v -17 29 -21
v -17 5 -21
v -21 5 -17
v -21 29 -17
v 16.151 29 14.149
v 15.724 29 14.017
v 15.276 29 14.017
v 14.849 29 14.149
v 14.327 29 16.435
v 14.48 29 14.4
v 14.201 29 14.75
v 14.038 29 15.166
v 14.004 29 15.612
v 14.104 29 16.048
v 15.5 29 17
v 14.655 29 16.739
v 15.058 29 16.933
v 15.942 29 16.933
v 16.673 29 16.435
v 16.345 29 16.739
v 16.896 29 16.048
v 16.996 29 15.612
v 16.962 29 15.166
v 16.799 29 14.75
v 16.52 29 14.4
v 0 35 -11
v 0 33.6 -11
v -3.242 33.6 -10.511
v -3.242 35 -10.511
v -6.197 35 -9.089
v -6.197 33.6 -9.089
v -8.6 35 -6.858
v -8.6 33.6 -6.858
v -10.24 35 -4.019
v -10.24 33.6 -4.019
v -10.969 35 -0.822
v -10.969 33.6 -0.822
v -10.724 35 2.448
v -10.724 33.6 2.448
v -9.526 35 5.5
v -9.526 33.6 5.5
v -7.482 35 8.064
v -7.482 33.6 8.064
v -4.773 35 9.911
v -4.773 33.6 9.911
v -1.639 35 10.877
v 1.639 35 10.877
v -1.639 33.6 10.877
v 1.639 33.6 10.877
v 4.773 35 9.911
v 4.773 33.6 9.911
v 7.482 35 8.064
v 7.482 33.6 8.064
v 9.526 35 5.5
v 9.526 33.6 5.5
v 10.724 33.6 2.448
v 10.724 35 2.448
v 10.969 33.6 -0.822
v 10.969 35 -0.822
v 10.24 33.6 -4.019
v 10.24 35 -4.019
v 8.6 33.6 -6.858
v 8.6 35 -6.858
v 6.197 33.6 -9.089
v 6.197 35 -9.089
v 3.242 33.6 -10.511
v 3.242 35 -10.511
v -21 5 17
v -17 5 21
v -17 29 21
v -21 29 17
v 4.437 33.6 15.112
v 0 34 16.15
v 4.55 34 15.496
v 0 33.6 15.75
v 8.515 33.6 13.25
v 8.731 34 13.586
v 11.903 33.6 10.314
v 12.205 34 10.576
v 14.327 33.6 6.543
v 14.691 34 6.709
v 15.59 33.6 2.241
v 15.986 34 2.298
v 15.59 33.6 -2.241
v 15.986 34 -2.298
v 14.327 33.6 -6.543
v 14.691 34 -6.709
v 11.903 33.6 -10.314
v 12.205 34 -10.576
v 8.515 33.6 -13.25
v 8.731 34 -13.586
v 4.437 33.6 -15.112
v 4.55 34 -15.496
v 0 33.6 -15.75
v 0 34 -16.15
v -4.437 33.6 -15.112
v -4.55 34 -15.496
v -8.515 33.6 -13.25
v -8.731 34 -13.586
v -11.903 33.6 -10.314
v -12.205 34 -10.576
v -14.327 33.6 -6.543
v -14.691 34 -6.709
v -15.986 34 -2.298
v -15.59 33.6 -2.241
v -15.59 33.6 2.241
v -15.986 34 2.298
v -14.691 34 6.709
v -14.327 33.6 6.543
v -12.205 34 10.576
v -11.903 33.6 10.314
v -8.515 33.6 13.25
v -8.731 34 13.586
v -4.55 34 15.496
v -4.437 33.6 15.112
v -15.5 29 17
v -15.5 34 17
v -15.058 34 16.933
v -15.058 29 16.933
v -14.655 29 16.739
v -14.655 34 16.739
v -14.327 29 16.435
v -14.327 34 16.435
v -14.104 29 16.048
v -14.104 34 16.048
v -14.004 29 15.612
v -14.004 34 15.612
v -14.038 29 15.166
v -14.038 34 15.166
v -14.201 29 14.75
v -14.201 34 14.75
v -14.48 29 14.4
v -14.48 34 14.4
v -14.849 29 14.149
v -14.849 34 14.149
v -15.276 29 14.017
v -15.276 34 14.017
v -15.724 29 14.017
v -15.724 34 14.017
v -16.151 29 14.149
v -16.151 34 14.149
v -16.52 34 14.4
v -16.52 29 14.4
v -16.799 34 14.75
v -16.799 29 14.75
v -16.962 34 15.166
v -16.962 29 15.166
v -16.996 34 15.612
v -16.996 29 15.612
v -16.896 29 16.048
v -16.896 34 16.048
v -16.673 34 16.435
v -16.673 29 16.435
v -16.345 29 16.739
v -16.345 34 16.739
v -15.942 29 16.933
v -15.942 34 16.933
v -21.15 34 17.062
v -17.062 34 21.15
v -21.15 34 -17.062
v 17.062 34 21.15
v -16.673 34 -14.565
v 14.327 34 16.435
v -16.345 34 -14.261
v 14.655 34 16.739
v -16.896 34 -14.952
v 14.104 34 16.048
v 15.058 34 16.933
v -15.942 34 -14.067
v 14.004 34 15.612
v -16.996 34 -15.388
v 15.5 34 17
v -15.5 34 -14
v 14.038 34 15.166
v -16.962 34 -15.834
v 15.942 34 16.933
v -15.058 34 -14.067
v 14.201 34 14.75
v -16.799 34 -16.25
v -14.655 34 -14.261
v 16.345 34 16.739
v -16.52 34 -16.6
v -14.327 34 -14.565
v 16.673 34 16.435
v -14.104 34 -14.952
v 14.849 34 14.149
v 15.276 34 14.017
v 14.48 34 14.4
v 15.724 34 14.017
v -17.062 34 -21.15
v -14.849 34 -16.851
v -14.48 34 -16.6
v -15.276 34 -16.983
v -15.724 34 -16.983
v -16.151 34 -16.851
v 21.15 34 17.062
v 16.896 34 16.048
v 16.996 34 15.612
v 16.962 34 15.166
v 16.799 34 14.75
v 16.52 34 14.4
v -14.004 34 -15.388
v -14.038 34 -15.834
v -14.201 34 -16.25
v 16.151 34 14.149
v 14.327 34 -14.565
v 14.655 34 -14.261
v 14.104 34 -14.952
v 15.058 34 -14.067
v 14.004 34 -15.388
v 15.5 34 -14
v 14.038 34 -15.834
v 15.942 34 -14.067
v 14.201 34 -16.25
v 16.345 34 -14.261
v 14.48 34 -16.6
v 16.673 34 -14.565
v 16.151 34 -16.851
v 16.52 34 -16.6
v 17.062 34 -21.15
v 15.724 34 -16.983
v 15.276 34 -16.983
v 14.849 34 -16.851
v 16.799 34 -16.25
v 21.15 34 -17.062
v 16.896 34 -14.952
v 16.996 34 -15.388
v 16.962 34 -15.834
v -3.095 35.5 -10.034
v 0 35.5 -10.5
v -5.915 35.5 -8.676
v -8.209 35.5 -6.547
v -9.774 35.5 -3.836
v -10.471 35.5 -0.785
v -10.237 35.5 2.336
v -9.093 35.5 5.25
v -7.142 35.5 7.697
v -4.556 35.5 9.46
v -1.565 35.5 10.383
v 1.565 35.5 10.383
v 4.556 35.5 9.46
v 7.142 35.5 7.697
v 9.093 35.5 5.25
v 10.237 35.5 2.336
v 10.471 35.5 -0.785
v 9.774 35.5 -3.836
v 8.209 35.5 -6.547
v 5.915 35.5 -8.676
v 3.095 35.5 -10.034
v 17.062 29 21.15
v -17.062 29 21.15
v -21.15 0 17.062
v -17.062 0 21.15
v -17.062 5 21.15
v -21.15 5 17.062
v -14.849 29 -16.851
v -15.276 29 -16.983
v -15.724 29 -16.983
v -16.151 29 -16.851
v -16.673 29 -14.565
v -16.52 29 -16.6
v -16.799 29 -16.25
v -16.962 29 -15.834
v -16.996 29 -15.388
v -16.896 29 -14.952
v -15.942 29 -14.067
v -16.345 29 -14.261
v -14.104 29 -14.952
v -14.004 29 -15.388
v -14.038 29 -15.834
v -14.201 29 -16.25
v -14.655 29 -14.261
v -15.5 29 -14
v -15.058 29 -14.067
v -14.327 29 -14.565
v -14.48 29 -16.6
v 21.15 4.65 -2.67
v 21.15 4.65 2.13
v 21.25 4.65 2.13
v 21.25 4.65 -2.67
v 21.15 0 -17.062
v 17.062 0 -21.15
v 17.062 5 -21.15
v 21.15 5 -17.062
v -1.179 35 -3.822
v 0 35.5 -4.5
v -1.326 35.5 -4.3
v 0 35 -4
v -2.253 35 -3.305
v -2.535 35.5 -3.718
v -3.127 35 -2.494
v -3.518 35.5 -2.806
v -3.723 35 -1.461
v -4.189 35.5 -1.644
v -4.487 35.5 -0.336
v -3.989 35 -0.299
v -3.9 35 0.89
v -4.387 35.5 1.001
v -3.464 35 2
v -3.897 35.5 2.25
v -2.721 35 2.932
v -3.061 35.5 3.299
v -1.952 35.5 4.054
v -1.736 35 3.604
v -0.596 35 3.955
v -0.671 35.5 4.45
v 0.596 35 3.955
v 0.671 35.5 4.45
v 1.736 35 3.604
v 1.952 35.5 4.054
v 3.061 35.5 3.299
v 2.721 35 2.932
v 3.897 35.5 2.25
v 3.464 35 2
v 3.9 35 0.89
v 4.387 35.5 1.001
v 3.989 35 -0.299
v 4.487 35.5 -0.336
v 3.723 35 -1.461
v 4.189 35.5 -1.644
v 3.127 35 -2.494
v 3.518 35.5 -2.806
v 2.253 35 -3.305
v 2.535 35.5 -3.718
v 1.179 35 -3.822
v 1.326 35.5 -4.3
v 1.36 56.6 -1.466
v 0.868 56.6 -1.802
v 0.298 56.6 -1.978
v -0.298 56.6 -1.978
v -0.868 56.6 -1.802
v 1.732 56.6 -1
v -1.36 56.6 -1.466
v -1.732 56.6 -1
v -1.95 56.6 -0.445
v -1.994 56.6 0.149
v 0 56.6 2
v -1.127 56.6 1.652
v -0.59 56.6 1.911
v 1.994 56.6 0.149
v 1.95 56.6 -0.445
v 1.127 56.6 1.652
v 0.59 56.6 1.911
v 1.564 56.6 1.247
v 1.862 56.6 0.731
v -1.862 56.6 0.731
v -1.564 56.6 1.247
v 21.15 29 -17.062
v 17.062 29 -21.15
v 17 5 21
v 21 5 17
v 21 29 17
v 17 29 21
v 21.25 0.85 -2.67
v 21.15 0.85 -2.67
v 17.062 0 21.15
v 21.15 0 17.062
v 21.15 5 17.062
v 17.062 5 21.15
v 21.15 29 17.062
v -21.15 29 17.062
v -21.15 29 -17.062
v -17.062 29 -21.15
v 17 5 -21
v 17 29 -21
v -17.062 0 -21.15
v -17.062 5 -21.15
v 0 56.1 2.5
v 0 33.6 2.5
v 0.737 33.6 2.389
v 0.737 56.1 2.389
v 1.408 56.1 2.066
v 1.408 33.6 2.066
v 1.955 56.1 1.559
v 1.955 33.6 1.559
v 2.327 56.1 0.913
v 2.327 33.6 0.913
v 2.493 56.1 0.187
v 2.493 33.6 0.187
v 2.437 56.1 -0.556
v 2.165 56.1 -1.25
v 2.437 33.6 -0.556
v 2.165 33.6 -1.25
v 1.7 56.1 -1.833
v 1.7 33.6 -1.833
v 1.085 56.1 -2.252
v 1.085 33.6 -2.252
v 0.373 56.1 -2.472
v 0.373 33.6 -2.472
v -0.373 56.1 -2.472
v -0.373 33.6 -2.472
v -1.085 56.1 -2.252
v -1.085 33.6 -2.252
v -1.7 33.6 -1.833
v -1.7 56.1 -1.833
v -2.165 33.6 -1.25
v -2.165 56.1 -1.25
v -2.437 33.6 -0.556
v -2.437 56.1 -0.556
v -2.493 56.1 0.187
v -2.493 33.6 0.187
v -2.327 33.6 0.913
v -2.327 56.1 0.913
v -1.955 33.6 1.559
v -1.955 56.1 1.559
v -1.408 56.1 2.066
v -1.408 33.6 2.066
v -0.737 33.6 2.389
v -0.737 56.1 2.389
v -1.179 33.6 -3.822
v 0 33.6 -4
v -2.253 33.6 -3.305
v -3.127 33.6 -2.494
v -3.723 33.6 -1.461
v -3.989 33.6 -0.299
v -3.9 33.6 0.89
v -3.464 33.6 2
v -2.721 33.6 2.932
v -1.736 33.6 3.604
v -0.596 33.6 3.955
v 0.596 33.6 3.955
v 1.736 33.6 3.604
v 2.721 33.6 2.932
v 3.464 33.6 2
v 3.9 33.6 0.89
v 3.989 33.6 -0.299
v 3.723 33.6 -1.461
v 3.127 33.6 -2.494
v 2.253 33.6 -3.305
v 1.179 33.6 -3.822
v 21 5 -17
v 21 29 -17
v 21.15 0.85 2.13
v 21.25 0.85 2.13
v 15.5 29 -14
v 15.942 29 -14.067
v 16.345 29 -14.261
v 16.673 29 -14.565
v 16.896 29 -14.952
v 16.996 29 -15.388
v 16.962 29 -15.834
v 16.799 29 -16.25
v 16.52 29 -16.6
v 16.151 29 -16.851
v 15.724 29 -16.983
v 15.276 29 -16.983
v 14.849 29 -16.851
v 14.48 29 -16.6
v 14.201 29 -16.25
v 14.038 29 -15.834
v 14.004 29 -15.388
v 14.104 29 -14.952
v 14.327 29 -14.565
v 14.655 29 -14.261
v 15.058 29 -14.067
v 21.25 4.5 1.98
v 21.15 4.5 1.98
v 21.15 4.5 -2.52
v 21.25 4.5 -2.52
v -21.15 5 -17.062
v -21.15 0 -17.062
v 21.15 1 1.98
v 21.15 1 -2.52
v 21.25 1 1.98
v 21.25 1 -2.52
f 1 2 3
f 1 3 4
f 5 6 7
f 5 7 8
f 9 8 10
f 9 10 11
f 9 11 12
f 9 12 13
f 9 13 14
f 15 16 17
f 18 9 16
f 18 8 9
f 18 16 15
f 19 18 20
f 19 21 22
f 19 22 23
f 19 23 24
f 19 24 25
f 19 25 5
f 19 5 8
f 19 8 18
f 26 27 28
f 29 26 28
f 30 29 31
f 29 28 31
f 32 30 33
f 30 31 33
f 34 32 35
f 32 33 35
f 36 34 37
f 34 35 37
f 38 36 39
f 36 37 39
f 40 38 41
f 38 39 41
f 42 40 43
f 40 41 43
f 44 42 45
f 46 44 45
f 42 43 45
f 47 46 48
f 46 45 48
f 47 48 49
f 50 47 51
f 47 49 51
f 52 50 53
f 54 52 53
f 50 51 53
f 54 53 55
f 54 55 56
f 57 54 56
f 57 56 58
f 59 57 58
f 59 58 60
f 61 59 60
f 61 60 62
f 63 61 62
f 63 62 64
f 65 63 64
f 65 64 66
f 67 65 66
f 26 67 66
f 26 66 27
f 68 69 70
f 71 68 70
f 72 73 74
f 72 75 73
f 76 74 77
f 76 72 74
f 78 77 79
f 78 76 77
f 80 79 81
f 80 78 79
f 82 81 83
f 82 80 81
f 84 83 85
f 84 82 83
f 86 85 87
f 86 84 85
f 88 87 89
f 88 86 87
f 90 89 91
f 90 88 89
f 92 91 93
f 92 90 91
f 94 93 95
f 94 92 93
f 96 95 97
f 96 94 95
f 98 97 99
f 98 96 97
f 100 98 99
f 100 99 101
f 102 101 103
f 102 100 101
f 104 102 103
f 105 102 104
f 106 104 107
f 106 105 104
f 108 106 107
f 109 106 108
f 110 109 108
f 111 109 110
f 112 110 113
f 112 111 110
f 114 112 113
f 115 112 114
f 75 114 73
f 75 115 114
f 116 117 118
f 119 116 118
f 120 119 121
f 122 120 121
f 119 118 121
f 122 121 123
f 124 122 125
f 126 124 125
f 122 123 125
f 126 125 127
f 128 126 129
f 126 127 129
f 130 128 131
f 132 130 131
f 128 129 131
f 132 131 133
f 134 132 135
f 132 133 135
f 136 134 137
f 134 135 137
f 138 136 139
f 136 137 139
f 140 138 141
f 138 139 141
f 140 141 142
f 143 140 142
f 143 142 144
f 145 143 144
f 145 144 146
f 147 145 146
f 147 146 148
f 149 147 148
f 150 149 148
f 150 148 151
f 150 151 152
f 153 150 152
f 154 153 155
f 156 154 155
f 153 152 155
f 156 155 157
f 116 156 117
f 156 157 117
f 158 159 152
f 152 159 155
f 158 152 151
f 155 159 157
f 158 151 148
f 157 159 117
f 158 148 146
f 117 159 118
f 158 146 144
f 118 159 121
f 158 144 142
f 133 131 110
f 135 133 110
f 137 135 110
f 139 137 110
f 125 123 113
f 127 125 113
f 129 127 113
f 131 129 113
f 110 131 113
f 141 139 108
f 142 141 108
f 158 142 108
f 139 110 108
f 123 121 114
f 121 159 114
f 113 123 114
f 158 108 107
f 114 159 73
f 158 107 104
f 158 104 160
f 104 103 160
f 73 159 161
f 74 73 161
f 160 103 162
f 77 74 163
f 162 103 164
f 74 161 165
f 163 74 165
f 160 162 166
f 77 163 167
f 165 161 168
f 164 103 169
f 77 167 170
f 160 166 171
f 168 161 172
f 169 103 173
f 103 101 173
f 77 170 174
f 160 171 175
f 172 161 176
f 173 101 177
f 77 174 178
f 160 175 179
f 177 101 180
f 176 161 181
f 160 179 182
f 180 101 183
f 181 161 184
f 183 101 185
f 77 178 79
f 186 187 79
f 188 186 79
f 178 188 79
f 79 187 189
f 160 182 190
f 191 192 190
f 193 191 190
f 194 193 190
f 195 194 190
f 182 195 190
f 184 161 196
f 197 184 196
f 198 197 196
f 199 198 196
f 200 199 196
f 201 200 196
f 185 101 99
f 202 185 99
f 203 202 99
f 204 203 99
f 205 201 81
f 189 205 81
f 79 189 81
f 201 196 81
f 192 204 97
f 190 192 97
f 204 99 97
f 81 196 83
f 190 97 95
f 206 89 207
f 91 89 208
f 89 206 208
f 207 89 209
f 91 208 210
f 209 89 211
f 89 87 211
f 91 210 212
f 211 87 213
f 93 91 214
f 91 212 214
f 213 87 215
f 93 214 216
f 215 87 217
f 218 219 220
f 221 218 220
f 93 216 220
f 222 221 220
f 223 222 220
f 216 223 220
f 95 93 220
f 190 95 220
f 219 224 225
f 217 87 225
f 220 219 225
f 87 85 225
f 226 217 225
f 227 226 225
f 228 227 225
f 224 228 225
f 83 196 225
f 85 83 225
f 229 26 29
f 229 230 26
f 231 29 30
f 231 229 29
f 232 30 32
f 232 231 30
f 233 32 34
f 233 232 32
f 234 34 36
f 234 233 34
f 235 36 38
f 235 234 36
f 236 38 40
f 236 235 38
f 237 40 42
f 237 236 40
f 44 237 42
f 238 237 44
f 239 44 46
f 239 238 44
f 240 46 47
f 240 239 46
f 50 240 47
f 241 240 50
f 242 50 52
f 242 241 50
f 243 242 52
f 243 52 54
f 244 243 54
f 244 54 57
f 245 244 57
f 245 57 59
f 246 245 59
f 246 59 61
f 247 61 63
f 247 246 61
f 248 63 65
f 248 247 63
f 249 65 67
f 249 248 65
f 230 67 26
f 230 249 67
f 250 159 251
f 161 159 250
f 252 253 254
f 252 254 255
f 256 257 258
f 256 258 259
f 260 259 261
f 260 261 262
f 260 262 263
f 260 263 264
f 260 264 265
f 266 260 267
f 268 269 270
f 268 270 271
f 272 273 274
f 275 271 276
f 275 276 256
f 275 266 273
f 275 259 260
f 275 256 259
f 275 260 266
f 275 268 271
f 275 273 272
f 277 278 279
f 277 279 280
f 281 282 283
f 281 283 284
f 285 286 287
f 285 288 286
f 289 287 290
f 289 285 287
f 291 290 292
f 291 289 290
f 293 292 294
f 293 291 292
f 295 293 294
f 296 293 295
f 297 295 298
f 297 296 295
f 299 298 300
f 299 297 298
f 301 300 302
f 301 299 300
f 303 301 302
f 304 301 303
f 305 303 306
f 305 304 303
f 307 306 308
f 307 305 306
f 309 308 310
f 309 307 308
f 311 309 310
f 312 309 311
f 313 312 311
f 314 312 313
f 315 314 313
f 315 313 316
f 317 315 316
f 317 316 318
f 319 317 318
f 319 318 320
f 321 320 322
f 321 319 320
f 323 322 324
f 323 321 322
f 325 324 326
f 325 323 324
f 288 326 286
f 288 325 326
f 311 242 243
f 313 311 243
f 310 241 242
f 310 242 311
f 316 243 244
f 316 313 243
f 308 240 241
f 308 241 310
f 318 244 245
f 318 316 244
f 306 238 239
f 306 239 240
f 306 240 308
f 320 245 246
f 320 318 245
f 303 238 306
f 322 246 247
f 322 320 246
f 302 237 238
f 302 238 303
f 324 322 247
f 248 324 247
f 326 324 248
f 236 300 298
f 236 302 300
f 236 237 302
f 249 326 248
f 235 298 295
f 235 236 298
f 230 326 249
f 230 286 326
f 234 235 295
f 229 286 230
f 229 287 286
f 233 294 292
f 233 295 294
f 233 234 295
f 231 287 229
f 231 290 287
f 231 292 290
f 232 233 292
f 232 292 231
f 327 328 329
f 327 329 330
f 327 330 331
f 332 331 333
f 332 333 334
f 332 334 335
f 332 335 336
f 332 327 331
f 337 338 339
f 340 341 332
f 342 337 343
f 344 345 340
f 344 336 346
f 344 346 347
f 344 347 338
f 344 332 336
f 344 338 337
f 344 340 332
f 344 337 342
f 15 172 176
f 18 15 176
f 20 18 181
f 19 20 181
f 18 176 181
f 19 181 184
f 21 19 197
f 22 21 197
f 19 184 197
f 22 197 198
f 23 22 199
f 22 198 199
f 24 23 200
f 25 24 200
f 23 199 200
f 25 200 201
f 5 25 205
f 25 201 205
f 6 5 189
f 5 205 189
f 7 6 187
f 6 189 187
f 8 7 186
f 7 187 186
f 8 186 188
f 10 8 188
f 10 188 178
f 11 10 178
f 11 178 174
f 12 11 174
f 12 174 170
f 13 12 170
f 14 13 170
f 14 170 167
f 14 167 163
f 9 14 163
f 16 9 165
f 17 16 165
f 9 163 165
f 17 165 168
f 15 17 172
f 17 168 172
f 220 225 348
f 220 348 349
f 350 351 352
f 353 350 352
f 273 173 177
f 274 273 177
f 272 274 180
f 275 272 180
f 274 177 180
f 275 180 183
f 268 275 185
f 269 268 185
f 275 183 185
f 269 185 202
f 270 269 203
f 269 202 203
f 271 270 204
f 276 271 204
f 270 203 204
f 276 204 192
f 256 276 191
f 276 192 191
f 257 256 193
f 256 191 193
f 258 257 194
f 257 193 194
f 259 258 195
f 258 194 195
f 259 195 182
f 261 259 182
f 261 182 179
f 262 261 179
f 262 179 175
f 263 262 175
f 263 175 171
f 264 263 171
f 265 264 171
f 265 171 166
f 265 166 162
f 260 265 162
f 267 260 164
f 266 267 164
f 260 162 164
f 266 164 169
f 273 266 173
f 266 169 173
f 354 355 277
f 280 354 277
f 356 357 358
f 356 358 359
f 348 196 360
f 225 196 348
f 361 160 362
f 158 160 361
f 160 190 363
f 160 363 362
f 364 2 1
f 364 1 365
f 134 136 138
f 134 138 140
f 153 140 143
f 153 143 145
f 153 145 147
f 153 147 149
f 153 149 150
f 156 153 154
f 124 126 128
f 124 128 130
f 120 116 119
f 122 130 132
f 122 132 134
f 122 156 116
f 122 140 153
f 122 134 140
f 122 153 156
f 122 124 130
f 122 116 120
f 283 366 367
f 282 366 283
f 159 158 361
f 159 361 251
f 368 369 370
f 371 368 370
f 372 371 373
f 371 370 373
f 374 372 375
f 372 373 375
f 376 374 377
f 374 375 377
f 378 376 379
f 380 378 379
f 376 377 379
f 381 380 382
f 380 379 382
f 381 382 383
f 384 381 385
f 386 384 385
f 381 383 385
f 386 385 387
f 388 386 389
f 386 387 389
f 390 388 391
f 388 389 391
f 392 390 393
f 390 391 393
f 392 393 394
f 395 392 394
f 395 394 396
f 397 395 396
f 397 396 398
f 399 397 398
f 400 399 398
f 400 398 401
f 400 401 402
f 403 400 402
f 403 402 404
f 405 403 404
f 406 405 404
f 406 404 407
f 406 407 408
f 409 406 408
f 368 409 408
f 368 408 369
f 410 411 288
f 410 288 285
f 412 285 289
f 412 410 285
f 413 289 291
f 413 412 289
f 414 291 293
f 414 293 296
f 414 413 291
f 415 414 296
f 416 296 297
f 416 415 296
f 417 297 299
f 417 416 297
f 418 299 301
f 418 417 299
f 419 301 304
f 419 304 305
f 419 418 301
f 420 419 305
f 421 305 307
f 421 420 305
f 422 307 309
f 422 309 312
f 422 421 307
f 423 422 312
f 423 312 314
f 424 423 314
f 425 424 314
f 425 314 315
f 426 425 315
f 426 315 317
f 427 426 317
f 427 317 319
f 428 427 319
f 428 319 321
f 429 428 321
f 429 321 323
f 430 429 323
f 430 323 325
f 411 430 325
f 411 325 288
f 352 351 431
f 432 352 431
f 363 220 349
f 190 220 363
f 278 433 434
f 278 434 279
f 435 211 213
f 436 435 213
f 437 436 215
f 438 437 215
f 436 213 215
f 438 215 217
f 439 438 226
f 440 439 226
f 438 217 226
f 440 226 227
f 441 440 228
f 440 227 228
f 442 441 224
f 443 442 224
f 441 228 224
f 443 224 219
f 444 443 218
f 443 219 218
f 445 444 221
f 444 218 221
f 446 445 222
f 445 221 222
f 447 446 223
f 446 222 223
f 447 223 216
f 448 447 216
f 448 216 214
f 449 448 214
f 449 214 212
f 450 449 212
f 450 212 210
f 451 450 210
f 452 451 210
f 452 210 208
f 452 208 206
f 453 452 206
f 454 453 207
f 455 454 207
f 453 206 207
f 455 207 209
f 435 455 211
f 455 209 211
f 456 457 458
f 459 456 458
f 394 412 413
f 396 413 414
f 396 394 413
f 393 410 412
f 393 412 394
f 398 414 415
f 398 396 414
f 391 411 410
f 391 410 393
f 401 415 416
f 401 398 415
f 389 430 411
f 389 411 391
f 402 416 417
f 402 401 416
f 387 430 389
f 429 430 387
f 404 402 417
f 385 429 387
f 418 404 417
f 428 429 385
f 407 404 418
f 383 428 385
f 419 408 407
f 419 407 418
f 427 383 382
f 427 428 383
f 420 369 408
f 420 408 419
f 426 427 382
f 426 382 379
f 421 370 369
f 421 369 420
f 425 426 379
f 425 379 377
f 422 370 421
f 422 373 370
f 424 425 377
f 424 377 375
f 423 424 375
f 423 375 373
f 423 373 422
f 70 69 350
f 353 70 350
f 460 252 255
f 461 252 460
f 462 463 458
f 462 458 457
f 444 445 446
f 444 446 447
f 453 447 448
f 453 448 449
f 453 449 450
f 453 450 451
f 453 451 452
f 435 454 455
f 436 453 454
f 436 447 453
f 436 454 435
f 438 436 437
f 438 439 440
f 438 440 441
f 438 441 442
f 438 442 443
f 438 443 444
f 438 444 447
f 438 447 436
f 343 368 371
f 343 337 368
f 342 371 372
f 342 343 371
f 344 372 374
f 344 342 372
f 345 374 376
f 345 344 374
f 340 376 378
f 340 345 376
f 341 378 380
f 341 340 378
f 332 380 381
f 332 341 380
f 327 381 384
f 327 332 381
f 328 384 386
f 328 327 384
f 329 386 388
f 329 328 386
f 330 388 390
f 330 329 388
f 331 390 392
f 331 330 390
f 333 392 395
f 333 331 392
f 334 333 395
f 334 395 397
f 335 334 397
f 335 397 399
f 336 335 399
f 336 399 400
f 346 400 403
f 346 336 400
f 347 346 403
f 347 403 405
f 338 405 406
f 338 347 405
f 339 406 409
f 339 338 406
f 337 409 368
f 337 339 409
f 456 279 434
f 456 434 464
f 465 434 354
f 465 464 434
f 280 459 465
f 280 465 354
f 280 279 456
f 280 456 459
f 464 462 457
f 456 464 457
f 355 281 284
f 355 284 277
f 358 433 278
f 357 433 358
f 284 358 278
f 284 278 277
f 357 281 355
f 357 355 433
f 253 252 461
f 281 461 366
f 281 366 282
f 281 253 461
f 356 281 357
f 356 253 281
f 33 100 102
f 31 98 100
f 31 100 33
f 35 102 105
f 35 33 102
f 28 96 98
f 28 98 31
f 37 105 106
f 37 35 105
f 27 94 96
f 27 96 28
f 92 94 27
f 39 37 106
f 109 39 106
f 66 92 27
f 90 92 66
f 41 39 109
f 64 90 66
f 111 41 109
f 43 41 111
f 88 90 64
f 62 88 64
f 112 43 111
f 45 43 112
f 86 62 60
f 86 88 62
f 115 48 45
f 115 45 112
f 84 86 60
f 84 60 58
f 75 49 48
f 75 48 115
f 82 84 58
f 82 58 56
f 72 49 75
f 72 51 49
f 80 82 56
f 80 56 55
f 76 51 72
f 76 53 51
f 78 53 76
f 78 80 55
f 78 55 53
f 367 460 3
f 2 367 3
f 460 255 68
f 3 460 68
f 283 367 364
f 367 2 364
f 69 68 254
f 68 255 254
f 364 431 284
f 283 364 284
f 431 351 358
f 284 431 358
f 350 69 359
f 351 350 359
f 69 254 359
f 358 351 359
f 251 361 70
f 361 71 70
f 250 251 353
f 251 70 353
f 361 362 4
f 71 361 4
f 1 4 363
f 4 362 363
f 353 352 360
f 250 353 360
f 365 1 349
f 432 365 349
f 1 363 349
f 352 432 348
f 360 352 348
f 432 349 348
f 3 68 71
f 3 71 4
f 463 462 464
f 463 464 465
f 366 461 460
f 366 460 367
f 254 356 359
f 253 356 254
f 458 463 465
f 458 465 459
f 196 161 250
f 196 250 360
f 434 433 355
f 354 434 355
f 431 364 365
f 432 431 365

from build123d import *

# Parameters (mm, degrees)
SKETCH1_W           = 42
SKETCH1_H           = 42
BOSS_EXTRUDE1_DEPTH = 34
CHAMFER1_SIZE       = 4
BOSS_EXTRUDE4_DEPTH = 5
BOSS_EXTRUDE5_DEPTH = 5
SKETCH2_R           = 16.25
CUT_EXTRUDE1_DEPTH  = 0.4
SKETCH3_R           = 11
SKETCH3_R_2         = 4
BOSS_EXTRUDE2_DEPTH = 1.9
SKETCH4_R           = 2.5
BOSS_EXTRUDE3_DEPTH = 23
CHAMFER2_SIZE       = 0.5
SKETCH5_R           = 1.5
CUT_EXTRUDE2_DEPTH  = 5
SKETCH8_W           = 4.8
SKETCH8_H           = 3.8
SKETCH8_W_2         = 4.5
SKETCH8_H_2         = 3.5
BOSS_EXTRUDE6_DEPTH = 0.1


with BuildPart() as part:
    # Sketch1 → Boss-Extrude1 (new body)
    with BuildSketch(Plane(origin=(0, 0, 0), x_dir=(1, 0, 0), z_dir=(0, 1, 0))):
        Rectangle(SKETCH1_W, SKETCH1_H)
    extrude(amount=BOSS_EXTRUDE1_DEPTH)

    # Chamfer1
    chamfer1_edges = [part.edges().sort_by_distance(p)[0] for p in [
        (21, 17, 21),
        (-21, 17, 21),
        (-21, 17, -21),
        (21, 17, -21),
    ]]
    chamfer(chamfer1_edges, length=CHAMFER1_SIZE)

    # Sketch6 → Boss-Extrude4 (add)
    with BuildSketch(Plane(origin=(0, 34, 0), x_dir=(1, 0, 0), z_dir=(0, 1, 0))):
        Polygon((17.062132034, 21.15), (-17.062132034, 21.15), (-21.15, 17.062132034), (-21.15, -17.062132034), (-17.062132034, -21.15), (17.062132034, -21.15), (21.15, -17.062132034), (21.15, 17.062132034), align=None)
    extrude(amount=-BOSS_EXTRUDE4_DEPTH)

    # Sketch7 → Boss-Extrude5 (add)
    with BuildSketch(Plane.XZ):
        Polygon((-21.15, 17.062132034), (-21.15, -17.062132034), (-17.062132034, -21.15), (17.062132034, -21.15), (21.15, -17.062132034), (21.15, 17.062132034), (17.062132034, 21.15), (-17.062132034, 21.15), align=None)
    extrude(amount=-BOSS_EXTRUDE5_DEPTH)

    # Sketch2 → Cut-Extrude1 (cut)
    with BuildSketch(Plane(origin=(0, 34, 0), x_dir=(1, 0, 0), z_dir=(0, 1, 0))):
        with Locations(Location((0, 0, 0), (0, 0, 270))):
            Circle(SKETCH2_R)
    extrude(amount=-CUT_EXTRUDE1_DEPTH, mode=Mode.SUBTRACT)

    # Sketch3 → Boss-Extrude2 (add)
    with BuildSketch(Plane(origin=(0, 33.6, 0), x_dir=(1, 0, 0), z_dir=(0, 1, 0))):
        with Locations(Location((0, 0, 0), (0, 0, 90))):
            Circle(SKETCH3_R)
        with Locations(Location((0, 0, 0), (0, 0, 90))):
            Circle(SKETCH3_R_2, mode=Mode.SUBTRACT)
    extrude(amount=BOSS_EXTRUDE2_DEPTH)

    # Sketch4 → Boss-Extrude3 (add)
    with BuildSketch(Plane(origin=(0, 33.6, 0), x_dir=(1, 0, 0), z_dir=(0, 1, 0))):
        with Locations(Location((0, 0, 0), (0, 0, 270))):
            Circle(SKETCH4_R)
    extrude(amount=BOSS_EXTRUDE3_DEPTH)

    # Chamfer2
    # the kernel refuses this chamfer: 0.5 mm, written as the material it adds along each edge
    with BuildSketch(Plane(origin=(0, 33.6, 0), x_dir=(0, 0, 1), z_dir=(-1, 0, 0))) as chamfer2_piece_1_section:
        Polygon((16.25, CHAMFER2_SIZE), (16.25 - CHAMFER2_SIZE, 0), (16.25, 0), align=None)
    chamfer2_piece_1 = revolve(axis=Axis((0, 33.6, 0), (0, 1, 0)), mode=Mode.PRIVATE)
    chamfer2_piece_1 = split(chamfer2_piece_1, bisect_by=Plane(origin=(0, 34, -15.959627936), z_dir=(0, -1, 0)), keep=Keep.TOP, mode=Mode.PRIVATE)
    add(chamfer2_piece_1)
    # the kernel refuses this chamfer: 0.5 mm, written as the material it takes off along each edge
    with BuildSketch(Plane(origin=(0, 35.5, 0), x_dir=(0, 0, -1), z_dir=(1, 0, 0))) as chamfer2_2_piece_1:
        Polygon((4 + CHAMFER2_SIZE, 0), (4, -CHAMFER2_SIZE), (4, 0), align=None)
    revolve(axis=Axis((0, 35.5, 0), (0, 1, 0)), mode=Mode.SUBTRACT)
    with BuildSketch(Plane(origin=(0, 35.5, 0), x_dir=(0, 0, -1), z_dir=(1, 0, 0))) as chamfer2_2_piece_2:
        Polygon((11, -CHAMFER2_SIZE), (11 - CHAMFER2_SIZE, 0), (11, 0), align=None)
    revolve(axis=Axis((0, 35.5, 0), (0, 1, 0)), mode=Mode.SUBTRACT)
    with BuildSketch(Plane(origin=(0, 56.6, 0), x_dir=(0, 0, 1), z_dir=(-1, 0, 0))) as chamfer2_2_piece_3:
        Polygon((2.5, -CHAMFER2_SIZE), (2.5 - CHAMFER2_SIZE, 0), (2.5, 0), align=None)
    revolve(axis=Axis((0, 56.6, 0), (0, 1, 0)), mode=Mode.SUBTRACT)

    # Sketch5 → Cut-Extrude2 (cut)
    with BuildSketch(Plane(origin=(0, 34, 0), x_dir=(1, 0, 0), z_dir=(0, 1, 0))):
        with Locations(Location((-15.5, 15.5, 0), (0, 0, 270))):
            Circle(SKETCH5_R)
        with Locations(Location((15.5, 15.5, 0), (0, 0, 270))):
            Circle(SKETCH5_R)
        with Locations(Location((15.5, -15.5, 0), (0, 0, 270))):
            Circle(SKETCH5_R)
        with Locations(Location((-15.5, -15.5, 0), (0, 0, 270))):
            Circle(SKETCH5_R)
    extrude(amount=-CUT_EXTRUDE2_DEPTH, mode=Mode.SUBTRACT)

    # Sketch8 → Boss-Extrude6 (add)
    with BuildSketch(Plane(origin=(21.15, 0, 0), x_dir=(0, 0, -1), z_dir=(1, 0, 0))):
        with Locations((0.269797982, 2.75)):
            Rectangle(SKETCH8_W, SKETCH8_H)
        with Locations((0.269797982, 2.75)):
            Rectangle(SKETCH8_W_2, SKETCH8_H_2, mode=Mode.SUBTRACT)
    extrude(amount=BOSS_EXTRUDE6_DEPTH)


solid = part.part
